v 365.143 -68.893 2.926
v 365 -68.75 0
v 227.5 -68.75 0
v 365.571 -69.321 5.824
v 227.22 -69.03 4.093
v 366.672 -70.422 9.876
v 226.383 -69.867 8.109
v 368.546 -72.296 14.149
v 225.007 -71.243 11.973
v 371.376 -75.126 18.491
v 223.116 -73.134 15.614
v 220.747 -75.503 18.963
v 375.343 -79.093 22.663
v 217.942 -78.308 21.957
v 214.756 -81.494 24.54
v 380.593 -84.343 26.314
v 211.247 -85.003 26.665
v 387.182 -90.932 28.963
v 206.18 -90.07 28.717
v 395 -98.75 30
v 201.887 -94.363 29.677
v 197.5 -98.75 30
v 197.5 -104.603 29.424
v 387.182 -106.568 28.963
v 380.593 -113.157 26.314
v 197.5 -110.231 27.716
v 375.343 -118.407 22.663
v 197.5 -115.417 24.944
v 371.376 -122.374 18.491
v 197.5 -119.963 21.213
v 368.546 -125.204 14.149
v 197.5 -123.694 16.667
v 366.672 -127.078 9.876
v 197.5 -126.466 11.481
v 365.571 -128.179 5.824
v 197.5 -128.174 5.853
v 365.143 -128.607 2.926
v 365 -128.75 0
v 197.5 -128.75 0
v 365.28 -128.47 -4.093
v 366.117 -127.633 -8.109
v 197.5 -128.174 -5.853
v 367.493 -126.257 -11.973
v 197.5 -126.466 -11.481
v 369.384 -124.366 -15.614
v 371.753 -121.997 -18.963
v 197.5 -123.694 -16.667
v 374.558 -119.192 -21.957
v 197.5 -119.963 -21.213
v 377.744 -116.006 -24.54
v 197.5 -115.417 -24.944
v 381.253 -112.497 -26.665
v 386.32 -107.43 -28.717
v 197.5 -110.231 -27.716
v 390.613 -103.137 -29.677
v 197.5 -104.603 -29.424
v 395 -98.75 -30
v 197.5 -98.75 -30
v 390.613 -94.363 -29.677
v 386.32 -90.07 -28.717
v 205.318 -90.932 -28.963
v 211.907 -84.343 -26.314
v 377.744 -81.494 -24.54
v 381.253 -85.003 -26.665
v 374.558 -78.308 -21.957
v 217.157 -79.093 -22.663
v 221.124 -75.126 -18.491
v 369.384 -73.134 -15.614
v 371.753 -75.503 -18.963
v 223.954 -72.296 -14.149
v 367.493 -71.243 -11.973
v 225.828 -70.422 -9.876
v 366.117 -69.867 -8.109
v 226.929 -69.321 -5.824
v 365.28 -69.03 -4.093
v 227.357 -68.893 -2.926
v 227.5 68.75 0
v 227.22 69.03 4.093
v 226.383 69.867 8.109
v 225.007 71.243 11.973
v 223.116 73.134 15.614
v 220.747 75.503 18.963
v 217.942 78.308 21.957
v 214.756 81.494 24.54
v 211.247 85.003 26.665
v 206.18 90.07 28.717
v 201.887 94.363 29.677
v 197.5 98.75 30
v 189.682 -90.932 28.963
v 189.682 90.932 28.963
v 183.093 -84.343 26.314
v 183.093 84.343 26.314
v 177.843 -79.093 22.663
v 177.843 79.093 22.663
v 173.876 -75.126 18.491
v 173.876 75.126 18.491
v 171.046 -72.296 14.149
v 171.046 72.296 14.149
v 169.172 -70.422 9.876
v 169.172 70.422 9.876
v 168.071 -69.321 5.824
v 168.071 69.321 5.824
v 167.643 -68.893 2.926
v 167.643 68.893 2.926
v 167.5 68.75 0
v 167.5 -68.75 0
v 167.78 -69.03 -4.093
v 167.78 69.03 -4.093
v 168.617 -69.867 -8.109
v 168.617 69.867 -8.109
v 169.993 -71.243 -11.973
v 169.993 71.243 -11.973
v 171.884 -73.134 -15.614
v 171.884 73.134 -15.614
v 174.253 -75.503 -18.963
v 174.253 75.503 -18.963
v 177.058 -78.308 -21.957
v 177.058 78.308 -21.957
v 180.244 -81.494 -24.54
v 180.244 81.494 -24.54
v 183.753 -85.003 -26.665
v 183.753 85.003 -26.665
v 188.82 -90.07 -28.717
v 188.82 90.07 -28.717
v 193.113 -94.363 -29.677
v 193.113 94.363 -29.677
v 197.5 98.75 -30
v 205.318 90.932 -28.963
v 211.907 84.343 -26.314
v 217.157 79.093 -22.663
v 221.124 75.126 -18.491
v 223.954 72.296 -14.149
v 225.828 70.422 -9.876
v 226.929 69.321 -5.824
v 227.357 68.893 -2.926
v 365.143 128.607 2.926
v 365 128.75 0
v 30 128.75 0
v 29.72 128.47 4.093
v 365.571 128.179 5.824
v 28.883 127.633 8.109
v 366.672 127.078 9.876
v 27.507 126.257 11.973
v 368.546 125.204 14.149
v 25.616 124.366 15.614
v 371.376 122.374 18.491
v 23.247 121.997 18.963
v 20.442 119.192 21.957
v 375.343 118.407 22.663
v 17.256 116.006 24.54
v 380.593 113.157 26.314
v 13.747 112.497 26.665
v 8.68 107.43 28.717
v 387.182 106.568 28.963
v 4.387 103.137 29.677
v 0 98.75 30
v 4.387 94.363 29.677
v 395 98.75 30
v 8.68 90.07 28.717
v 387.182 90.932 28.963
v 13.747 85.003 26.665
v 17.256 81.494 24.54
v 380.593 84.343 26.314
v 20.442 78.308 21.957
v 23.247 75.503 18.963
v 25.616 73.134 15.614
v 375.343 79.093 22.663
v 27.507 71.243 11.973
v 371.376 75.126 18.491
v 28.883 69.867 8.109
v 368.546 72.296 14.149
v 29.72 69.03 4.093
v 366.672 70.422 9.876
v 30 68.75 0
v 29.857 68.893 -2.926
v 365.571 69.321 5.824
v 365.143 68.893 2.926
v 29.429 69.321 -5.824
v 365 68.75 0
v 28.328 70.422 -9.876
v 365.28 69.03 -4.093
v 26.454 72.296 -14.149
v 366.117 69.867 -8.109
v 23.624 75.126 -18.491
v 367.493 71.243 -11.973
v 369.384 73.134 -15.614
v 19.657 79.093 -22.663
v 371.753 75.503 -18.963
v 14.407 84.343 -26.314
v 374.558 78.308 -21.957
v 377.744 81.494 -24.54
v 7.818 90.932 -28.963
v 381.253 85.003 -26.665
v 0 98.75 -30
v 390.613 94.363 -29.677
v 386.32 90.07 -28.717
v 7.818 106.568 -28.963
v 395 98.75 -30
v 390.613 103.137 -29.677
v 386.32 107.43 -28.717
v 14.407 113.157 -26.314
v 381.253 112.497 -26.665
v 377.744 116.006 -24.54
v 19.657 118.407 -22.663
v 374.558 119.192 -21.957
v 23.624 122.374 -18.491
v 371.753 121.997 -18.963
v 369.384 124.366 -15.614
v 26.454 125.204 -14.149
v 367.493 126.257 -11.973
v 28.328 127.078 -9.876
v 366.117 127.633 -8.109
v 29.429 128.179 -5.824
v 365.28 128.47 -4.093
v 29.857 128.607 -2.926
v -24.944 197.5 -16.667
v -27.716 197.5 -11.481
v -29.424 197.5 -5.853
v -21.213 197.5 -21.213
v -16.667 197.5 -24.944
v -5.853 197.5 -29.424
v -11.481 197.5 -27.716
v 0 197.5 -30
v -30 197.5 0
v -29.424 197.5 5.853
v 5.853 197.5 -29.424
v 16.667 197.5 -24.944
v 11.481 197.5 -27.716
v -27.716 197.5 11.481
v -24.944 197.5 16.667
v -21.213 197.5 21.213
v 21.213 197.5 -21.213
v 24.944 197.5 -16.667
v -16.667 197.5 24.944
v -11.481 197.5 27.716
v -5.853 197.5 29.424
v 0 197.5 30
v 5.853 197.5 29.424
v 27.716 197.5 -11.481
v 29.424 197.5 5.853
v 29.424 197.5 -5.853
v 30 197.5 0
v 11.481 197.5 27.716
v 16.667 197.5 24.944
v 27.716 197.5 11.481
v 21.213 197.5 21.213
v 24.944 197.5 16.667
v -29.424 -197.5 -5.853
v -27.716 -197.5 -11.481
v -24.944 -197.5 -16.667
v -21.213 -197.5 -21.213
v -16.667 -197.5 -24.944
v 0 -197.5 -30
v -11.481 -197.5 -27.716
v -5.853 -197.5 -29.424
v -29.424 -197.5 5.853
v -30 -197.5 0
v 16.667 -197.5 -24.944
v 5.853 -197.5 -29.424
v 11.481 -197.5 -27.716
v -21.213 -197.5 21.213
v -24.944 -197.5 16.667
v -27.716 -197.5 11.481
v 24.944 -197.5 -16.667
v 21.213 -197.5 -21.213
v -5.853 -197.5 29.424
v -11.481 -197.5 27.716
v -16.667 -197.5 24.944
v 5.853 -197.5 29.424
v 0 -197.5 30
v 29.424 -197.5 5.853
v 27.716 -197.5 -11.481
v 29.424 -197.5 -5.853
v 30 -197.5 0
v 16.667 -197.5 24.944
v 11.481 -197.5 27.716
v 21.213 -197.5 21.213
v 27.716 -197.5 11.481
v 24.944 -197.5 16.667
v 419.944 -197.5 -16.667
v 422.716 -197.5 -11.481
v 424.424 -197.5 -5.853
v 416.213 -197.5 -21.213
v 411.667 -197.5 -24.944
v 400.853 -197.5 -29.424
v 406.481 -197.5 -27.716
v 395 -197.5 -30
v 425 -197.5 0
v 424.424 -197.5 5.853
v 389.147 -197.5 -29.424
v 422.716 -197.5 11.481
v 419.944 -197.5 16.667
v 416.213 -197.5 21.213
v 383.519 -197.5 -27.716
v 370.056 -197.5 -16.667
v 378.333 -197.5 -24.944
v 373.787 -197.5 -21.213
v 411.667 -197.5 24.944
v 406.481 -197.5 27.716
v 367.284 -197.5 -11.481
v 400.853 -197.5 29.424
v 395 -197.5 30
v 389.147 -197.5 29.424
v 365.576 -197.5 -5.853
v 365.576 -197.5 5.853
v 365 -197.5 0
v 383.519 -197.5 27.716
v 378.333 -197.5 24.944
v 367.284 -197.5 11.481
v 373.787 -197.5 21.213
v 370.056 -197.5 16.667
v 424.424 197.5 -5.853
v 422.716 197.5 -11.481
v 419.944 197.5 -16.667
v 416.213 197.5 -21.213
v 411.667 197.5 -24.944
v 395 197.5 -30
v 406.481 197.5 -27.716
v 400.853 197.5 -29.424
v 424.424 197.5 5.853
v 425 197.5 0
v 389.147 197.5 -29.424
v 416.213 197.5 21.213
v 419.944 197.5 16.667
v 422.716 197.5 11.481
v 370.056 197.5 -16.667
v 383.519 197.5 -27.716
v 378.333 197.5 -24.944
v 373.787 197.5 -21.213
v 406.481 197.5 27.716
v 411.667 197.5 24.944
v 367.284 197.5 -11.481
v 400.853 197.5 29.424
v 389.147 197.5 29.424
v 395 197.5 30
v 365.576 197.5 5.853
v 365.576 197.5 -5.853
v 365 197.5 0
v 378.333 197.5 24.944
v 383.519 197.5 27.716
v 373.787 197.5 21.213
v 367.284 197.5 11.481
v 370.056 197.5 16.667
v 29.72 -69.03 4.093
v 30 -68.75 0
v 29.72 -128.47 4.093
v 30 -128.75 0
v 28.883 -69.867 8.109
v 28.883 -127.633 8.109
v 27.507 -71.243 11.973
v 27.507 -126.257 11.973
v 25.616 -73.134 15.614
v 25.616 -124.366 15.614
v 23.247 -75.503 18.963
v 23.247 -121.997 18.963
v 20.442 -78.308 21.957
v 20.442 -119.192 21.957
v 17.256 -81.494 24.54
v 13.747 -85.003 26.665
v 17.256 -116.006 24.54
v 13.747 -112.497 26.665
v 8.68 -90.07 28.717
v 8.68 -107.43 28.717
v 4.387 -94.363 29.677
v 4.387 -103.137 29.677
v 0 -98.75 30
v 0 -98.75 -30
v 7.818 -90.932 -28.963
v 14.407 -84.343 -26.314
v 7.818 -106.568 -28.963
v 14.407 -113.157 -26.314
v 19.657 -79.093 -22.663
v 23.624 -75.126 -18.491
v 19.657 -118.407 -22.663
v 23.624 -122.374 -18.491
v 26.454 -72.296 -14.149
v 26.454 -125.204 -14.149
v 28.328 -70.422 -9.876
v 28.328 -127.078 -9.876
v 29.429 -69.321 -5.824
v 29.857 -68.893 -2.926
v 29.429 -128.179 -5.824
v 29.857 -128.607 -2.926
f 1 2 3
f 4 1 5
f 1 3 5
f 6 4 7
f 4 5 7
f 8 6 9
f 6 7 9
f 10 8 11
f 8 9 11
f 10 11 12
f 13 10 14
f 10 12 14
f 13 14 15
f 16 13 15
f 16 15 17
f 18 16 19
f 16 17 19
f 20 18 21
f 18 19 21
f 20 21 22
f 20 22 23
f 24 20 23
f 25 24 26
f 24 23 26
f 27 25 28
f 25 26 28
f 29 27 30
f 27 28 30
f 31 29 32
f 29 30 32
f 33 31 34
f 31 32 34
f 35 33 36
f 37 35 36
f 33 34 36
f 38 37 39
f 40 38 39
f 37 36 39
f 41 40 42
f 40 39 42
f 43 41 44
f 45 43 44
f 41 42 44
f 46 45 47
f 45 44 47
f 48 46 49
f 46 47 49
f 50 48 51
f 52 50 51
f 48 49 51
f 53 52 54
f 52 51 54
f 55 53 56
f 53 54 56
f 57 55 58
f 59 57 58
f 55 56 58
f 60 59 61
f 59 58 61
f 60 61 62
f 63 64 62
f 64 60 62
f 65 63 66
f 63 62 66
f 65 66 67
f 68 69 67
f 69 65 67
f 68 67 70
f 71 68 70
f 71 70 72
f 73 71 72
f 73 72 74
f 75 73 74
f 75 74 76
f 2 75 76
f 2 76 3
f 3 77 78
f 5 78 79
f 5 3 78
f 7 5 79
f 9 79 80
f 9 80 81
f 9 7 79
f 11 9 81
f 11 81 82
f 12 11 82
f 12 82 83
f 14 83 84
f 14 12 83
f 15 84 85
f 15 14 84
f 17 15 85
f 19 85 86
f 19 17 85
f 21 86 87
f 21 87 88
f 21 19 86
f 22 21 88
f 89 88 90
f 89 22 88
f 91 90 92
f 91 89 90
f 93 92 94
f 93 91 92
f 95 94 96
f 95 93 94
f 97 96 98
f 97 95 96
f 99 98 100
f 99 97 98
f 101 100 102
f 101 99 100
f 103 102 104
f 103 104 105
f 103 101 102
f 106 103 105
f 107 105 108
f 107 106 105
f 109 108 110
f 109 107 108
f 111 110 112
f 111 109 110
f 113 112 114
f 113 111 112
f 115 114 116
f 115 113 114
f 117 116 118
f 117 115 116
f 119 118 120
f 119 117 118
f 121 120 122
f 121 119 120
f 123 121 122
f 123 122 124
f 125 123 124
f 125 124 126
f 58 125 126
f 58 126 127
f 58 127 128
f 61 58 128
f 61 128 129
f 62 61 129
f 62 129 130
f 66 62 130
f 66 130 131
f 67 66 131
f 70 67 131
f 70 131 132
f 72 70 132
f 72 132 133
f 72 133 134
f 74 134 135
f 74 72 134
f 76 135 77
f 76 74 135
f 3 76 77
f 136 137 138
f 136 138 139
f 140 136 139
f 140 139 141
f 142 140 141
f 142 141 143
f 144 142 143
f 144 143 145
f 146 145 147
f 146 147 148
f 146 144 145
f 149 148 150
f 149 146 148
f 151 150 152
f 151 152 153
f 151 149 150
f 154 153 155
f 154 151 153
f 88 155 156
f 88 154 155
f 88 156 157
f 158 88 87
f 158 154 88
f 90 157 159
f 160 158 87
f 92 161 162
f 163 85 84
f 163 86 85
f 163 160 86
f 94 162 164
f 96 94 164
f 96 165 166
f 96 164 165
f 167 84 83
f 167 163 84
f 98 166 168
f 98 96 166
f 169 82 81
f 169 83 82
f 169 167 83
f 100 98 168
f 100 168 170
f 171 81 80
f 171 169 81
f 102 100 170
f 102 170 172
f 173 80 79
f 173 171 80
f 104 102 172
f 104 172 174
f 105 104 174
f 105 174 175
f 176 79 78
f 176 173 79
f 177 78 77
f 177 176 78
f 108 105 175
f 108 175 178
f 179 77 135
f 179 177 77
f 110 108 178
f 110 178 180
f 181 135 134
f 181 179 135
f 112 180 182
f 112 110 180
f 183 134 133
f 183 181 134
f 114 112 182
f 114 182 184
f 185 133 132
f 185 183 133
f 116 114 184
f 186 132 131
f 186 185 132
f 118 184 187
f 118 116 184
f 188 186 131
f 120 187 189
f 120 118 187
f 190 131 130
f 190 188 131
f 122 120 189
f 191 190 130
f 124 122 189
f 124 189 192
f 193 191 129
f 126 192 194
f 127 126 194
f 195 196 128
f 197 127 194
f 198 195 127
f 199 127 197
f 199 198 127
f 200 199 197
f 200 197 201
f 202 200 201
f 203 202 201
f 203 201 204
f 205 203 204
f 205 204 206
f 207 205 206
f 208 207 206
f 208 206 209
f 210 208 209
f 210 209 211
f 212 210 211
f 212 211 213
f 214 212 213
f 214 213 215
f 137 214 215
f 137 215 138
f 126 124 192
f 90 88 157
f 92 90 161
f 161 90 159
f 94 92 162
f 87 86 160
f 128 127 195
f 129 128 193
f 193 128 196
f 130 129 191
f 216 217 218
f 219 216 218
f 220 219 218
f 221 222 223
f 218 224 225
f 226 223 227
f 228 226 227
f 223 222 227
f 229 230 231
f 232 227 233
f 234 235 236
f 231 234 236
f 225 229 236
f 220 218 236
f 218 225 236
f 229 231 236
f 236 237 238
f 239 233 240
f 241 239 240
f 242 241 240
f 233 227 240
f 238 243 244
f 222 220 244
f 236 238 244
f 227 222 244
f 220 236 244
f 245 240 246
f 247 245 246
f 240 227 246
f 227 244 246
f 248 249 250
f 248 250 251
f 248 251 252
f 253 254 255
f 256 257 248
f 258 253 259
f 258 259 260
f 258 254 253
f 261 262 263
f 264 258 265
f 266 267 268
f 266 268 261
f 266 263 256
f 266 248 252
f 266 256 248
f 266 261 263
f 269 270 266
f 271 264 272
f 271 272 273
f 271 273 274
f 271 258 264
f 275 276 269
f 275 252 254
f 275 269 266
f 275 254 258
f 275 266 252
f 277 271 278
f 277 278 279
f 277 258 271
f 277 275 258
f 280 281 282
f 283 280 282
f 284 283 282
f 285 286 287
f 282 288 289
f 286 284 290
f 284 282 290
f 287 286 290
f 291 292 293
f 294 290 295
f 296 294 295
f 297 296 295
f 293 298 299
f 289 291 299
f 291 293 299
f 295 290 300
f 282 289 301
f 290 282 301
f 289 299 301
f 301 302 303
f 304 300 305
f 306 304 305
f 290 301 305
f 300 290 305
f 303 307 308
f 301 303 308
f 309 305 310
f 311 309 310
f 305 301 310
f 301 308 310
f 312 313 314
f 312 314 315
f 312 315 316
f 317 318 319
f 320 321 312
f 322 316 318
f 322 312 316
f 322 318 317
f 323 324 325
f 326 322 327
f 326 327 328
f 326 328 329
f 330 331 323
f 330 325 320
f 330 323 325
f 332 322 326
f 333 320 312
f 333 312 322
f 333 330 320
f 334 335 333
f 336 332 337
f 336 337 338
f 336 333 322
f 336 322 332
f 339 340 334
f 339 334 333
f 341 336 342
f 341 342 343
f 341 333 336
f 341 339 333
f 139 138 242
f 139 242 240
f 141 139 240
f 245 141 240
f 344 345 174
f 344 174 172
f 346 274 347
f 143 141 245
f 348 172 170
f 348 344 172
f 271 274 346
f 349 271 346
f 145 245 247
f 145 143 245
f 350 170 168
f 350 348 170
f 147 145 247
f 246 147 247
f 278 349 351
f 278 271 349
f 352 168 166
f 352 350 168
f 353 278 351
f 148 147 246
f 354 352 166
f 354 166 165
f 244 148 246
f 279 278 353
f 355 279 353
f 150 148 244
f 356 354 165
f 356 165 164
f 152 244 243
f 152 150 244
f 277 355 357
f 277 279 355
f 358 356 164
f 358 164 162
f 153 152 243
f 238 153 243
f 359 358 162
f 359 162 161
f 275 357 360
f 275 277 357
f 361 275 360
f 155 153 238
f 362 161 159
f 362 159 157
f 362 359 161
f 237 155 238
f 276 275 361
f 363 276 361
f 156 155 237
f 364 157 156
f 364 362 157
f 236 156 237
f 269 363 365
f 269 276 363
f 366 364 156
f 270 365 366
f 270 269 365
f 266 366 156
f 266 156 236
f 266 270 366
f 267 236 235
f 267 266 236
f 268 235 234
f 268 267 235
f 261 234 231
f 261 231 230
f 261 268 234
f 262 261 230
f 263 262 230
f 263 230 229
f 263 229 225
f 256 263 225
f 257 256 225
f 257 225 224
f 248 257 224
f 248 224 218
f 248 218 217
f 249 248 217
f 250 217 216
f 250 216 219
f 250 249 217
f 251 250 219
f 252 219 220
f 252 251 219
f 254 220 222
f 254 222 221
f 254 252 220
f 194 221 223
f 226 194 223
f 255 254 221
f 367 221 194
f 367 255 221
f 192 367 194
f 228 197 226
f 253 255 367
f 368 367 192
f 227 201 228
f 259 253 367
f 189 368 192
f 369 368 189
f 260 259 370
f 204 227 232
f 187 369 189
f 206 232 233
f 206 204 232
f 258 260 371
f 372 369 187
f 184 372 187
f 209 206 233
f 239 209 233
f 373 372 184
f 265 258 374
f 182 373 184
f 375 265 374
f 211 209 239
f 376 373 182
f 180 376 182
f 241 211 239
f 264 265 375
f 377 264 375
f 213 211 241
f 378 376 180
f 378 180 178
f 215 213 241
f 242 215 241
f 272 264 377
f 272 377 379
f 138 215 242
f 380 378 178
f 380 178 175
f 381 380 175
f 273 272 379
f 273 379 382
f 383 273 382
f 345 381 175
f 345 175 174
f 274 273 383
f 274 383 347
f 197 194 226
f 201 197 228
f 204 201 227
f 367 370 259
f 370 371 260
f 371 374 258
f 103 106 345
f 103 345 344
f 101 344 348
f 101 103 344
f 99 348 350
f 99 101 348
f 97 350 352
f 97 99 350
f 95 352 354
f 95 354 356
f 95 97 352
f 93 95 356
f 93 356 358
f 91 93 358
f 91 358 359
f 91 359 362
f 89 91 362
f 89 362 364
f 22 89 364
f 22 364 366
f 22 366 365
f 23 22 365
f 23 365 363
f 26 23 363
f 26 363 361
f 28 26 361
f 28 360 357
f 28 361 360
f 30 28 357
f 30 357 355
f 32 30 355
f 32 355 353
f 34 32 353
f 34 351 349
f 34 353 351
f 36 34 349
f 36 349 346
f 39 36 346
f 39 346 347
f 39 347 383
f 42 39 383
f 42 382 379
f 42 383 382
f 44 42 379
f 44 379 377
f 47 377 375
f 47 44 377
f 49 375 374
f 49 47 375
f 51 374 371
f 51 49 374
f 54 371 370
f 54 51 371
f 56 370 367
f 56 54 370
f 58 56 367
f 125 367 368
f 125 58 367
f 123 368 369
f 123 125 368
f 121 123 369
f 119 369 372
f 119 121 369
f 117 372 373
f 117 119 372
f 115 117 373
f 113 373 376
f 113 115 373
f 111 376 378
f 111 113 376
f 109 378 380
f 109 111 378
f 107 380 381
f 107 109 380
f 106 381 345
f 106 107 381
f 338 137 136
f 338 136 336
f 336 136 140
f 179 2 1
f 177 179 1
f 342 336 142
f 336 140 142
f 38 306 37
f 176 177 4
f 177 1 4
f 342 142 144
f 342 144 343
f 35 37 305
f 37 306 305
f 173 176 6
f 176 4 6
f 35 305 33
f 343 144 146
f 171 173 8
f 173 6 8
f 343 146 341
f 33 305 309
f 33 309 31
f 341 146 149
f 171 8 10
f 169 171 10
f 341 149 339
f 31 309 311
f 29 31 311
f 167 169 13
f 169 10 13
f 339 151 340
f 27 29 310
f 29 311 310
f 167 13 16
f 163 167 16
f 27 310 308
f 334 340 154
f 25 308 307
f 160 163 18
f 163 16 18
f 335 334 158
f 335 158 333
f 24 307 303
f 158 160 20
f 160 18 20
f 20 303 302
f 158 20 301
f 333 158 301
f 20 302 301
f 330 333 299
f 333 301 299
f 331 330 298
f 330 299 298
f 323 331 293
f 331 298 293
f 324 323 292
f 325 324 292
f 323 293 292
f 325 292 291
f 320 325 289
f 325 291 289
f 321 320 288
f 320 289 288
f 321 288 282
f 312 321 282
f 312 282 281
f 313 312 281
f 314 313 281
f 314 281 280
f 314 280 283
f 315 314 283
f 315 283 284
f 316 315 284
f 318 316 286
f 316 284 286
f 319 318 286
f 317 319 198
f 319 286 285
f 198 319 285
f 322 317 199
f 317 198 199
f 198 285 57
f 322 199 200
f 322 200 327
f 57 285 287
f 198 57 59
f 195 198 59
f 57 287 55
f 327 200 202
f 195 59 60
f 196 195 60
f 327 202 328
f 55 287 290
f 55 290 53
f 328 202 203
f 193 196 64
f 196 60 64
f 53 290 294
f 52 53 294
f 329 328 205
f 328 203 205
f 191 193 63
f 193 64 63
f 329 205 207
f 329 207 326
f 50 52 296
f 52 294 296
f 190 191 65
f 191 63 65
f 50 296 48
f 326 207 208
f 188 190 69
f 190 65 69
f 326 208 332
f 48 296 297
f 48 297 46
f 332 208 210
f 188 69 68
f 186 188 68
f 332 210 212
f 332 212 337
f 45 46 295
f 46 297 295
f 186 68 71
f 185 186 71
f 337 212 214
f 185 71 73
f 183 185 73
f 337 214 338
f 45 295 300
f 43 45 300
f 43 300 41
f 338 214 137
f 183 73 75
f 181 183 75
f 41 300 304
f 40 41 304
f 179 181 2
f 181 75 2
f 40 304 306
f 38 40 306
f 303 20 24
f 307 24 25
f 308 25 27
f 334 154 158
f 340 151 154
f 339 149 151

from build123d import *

# Parameters (mm, degrees)
F0_R     = 30
F1_DEPTH = 197.5
F2_DEPTH = 98.75
F5_R     = 30
F6_DEPTH = 197.5


with BuildPart() as f1:
    # F0 (on Front) → F1 (new body, symmetric)
    with BuildSketch(Plane.XZ):
        Circle(F0_R)
    extrude(amount=F1_DEPTH, both=True)



with BuildPart() as f2:
    # F0 (on Front) → F2 (new body, symmetric)
    with BuildSketch(Plane.XZ):
        with Locations((197.5, 0)):
            Circle(F0_R)
    extrude(amount=F2_DEPTH, both=True)


with BuildPart() as f4_1:
    # F4: instance of F1
    add(f1.part.mirror(Plane.YZ.offset(197.5)))


with BuildPart() as f1_1:
    add(f1.part)

    add(f2.part)  # F6 merges F2

    add(f4_1.part)  # F6 merges F4_1
    # F5 (on plane+point) → F6 (join, symmetric)
    with BuildSketch(Plane.YZ.offset(197.5)):
        with Locations((-98.75, 0)):
            Circle(F5_R)
        with Locations((98.75, 0)):
            Circle(F5_R)
    extrude(amount=F6_DEPTH, both=True)


solid = f1_1.part
